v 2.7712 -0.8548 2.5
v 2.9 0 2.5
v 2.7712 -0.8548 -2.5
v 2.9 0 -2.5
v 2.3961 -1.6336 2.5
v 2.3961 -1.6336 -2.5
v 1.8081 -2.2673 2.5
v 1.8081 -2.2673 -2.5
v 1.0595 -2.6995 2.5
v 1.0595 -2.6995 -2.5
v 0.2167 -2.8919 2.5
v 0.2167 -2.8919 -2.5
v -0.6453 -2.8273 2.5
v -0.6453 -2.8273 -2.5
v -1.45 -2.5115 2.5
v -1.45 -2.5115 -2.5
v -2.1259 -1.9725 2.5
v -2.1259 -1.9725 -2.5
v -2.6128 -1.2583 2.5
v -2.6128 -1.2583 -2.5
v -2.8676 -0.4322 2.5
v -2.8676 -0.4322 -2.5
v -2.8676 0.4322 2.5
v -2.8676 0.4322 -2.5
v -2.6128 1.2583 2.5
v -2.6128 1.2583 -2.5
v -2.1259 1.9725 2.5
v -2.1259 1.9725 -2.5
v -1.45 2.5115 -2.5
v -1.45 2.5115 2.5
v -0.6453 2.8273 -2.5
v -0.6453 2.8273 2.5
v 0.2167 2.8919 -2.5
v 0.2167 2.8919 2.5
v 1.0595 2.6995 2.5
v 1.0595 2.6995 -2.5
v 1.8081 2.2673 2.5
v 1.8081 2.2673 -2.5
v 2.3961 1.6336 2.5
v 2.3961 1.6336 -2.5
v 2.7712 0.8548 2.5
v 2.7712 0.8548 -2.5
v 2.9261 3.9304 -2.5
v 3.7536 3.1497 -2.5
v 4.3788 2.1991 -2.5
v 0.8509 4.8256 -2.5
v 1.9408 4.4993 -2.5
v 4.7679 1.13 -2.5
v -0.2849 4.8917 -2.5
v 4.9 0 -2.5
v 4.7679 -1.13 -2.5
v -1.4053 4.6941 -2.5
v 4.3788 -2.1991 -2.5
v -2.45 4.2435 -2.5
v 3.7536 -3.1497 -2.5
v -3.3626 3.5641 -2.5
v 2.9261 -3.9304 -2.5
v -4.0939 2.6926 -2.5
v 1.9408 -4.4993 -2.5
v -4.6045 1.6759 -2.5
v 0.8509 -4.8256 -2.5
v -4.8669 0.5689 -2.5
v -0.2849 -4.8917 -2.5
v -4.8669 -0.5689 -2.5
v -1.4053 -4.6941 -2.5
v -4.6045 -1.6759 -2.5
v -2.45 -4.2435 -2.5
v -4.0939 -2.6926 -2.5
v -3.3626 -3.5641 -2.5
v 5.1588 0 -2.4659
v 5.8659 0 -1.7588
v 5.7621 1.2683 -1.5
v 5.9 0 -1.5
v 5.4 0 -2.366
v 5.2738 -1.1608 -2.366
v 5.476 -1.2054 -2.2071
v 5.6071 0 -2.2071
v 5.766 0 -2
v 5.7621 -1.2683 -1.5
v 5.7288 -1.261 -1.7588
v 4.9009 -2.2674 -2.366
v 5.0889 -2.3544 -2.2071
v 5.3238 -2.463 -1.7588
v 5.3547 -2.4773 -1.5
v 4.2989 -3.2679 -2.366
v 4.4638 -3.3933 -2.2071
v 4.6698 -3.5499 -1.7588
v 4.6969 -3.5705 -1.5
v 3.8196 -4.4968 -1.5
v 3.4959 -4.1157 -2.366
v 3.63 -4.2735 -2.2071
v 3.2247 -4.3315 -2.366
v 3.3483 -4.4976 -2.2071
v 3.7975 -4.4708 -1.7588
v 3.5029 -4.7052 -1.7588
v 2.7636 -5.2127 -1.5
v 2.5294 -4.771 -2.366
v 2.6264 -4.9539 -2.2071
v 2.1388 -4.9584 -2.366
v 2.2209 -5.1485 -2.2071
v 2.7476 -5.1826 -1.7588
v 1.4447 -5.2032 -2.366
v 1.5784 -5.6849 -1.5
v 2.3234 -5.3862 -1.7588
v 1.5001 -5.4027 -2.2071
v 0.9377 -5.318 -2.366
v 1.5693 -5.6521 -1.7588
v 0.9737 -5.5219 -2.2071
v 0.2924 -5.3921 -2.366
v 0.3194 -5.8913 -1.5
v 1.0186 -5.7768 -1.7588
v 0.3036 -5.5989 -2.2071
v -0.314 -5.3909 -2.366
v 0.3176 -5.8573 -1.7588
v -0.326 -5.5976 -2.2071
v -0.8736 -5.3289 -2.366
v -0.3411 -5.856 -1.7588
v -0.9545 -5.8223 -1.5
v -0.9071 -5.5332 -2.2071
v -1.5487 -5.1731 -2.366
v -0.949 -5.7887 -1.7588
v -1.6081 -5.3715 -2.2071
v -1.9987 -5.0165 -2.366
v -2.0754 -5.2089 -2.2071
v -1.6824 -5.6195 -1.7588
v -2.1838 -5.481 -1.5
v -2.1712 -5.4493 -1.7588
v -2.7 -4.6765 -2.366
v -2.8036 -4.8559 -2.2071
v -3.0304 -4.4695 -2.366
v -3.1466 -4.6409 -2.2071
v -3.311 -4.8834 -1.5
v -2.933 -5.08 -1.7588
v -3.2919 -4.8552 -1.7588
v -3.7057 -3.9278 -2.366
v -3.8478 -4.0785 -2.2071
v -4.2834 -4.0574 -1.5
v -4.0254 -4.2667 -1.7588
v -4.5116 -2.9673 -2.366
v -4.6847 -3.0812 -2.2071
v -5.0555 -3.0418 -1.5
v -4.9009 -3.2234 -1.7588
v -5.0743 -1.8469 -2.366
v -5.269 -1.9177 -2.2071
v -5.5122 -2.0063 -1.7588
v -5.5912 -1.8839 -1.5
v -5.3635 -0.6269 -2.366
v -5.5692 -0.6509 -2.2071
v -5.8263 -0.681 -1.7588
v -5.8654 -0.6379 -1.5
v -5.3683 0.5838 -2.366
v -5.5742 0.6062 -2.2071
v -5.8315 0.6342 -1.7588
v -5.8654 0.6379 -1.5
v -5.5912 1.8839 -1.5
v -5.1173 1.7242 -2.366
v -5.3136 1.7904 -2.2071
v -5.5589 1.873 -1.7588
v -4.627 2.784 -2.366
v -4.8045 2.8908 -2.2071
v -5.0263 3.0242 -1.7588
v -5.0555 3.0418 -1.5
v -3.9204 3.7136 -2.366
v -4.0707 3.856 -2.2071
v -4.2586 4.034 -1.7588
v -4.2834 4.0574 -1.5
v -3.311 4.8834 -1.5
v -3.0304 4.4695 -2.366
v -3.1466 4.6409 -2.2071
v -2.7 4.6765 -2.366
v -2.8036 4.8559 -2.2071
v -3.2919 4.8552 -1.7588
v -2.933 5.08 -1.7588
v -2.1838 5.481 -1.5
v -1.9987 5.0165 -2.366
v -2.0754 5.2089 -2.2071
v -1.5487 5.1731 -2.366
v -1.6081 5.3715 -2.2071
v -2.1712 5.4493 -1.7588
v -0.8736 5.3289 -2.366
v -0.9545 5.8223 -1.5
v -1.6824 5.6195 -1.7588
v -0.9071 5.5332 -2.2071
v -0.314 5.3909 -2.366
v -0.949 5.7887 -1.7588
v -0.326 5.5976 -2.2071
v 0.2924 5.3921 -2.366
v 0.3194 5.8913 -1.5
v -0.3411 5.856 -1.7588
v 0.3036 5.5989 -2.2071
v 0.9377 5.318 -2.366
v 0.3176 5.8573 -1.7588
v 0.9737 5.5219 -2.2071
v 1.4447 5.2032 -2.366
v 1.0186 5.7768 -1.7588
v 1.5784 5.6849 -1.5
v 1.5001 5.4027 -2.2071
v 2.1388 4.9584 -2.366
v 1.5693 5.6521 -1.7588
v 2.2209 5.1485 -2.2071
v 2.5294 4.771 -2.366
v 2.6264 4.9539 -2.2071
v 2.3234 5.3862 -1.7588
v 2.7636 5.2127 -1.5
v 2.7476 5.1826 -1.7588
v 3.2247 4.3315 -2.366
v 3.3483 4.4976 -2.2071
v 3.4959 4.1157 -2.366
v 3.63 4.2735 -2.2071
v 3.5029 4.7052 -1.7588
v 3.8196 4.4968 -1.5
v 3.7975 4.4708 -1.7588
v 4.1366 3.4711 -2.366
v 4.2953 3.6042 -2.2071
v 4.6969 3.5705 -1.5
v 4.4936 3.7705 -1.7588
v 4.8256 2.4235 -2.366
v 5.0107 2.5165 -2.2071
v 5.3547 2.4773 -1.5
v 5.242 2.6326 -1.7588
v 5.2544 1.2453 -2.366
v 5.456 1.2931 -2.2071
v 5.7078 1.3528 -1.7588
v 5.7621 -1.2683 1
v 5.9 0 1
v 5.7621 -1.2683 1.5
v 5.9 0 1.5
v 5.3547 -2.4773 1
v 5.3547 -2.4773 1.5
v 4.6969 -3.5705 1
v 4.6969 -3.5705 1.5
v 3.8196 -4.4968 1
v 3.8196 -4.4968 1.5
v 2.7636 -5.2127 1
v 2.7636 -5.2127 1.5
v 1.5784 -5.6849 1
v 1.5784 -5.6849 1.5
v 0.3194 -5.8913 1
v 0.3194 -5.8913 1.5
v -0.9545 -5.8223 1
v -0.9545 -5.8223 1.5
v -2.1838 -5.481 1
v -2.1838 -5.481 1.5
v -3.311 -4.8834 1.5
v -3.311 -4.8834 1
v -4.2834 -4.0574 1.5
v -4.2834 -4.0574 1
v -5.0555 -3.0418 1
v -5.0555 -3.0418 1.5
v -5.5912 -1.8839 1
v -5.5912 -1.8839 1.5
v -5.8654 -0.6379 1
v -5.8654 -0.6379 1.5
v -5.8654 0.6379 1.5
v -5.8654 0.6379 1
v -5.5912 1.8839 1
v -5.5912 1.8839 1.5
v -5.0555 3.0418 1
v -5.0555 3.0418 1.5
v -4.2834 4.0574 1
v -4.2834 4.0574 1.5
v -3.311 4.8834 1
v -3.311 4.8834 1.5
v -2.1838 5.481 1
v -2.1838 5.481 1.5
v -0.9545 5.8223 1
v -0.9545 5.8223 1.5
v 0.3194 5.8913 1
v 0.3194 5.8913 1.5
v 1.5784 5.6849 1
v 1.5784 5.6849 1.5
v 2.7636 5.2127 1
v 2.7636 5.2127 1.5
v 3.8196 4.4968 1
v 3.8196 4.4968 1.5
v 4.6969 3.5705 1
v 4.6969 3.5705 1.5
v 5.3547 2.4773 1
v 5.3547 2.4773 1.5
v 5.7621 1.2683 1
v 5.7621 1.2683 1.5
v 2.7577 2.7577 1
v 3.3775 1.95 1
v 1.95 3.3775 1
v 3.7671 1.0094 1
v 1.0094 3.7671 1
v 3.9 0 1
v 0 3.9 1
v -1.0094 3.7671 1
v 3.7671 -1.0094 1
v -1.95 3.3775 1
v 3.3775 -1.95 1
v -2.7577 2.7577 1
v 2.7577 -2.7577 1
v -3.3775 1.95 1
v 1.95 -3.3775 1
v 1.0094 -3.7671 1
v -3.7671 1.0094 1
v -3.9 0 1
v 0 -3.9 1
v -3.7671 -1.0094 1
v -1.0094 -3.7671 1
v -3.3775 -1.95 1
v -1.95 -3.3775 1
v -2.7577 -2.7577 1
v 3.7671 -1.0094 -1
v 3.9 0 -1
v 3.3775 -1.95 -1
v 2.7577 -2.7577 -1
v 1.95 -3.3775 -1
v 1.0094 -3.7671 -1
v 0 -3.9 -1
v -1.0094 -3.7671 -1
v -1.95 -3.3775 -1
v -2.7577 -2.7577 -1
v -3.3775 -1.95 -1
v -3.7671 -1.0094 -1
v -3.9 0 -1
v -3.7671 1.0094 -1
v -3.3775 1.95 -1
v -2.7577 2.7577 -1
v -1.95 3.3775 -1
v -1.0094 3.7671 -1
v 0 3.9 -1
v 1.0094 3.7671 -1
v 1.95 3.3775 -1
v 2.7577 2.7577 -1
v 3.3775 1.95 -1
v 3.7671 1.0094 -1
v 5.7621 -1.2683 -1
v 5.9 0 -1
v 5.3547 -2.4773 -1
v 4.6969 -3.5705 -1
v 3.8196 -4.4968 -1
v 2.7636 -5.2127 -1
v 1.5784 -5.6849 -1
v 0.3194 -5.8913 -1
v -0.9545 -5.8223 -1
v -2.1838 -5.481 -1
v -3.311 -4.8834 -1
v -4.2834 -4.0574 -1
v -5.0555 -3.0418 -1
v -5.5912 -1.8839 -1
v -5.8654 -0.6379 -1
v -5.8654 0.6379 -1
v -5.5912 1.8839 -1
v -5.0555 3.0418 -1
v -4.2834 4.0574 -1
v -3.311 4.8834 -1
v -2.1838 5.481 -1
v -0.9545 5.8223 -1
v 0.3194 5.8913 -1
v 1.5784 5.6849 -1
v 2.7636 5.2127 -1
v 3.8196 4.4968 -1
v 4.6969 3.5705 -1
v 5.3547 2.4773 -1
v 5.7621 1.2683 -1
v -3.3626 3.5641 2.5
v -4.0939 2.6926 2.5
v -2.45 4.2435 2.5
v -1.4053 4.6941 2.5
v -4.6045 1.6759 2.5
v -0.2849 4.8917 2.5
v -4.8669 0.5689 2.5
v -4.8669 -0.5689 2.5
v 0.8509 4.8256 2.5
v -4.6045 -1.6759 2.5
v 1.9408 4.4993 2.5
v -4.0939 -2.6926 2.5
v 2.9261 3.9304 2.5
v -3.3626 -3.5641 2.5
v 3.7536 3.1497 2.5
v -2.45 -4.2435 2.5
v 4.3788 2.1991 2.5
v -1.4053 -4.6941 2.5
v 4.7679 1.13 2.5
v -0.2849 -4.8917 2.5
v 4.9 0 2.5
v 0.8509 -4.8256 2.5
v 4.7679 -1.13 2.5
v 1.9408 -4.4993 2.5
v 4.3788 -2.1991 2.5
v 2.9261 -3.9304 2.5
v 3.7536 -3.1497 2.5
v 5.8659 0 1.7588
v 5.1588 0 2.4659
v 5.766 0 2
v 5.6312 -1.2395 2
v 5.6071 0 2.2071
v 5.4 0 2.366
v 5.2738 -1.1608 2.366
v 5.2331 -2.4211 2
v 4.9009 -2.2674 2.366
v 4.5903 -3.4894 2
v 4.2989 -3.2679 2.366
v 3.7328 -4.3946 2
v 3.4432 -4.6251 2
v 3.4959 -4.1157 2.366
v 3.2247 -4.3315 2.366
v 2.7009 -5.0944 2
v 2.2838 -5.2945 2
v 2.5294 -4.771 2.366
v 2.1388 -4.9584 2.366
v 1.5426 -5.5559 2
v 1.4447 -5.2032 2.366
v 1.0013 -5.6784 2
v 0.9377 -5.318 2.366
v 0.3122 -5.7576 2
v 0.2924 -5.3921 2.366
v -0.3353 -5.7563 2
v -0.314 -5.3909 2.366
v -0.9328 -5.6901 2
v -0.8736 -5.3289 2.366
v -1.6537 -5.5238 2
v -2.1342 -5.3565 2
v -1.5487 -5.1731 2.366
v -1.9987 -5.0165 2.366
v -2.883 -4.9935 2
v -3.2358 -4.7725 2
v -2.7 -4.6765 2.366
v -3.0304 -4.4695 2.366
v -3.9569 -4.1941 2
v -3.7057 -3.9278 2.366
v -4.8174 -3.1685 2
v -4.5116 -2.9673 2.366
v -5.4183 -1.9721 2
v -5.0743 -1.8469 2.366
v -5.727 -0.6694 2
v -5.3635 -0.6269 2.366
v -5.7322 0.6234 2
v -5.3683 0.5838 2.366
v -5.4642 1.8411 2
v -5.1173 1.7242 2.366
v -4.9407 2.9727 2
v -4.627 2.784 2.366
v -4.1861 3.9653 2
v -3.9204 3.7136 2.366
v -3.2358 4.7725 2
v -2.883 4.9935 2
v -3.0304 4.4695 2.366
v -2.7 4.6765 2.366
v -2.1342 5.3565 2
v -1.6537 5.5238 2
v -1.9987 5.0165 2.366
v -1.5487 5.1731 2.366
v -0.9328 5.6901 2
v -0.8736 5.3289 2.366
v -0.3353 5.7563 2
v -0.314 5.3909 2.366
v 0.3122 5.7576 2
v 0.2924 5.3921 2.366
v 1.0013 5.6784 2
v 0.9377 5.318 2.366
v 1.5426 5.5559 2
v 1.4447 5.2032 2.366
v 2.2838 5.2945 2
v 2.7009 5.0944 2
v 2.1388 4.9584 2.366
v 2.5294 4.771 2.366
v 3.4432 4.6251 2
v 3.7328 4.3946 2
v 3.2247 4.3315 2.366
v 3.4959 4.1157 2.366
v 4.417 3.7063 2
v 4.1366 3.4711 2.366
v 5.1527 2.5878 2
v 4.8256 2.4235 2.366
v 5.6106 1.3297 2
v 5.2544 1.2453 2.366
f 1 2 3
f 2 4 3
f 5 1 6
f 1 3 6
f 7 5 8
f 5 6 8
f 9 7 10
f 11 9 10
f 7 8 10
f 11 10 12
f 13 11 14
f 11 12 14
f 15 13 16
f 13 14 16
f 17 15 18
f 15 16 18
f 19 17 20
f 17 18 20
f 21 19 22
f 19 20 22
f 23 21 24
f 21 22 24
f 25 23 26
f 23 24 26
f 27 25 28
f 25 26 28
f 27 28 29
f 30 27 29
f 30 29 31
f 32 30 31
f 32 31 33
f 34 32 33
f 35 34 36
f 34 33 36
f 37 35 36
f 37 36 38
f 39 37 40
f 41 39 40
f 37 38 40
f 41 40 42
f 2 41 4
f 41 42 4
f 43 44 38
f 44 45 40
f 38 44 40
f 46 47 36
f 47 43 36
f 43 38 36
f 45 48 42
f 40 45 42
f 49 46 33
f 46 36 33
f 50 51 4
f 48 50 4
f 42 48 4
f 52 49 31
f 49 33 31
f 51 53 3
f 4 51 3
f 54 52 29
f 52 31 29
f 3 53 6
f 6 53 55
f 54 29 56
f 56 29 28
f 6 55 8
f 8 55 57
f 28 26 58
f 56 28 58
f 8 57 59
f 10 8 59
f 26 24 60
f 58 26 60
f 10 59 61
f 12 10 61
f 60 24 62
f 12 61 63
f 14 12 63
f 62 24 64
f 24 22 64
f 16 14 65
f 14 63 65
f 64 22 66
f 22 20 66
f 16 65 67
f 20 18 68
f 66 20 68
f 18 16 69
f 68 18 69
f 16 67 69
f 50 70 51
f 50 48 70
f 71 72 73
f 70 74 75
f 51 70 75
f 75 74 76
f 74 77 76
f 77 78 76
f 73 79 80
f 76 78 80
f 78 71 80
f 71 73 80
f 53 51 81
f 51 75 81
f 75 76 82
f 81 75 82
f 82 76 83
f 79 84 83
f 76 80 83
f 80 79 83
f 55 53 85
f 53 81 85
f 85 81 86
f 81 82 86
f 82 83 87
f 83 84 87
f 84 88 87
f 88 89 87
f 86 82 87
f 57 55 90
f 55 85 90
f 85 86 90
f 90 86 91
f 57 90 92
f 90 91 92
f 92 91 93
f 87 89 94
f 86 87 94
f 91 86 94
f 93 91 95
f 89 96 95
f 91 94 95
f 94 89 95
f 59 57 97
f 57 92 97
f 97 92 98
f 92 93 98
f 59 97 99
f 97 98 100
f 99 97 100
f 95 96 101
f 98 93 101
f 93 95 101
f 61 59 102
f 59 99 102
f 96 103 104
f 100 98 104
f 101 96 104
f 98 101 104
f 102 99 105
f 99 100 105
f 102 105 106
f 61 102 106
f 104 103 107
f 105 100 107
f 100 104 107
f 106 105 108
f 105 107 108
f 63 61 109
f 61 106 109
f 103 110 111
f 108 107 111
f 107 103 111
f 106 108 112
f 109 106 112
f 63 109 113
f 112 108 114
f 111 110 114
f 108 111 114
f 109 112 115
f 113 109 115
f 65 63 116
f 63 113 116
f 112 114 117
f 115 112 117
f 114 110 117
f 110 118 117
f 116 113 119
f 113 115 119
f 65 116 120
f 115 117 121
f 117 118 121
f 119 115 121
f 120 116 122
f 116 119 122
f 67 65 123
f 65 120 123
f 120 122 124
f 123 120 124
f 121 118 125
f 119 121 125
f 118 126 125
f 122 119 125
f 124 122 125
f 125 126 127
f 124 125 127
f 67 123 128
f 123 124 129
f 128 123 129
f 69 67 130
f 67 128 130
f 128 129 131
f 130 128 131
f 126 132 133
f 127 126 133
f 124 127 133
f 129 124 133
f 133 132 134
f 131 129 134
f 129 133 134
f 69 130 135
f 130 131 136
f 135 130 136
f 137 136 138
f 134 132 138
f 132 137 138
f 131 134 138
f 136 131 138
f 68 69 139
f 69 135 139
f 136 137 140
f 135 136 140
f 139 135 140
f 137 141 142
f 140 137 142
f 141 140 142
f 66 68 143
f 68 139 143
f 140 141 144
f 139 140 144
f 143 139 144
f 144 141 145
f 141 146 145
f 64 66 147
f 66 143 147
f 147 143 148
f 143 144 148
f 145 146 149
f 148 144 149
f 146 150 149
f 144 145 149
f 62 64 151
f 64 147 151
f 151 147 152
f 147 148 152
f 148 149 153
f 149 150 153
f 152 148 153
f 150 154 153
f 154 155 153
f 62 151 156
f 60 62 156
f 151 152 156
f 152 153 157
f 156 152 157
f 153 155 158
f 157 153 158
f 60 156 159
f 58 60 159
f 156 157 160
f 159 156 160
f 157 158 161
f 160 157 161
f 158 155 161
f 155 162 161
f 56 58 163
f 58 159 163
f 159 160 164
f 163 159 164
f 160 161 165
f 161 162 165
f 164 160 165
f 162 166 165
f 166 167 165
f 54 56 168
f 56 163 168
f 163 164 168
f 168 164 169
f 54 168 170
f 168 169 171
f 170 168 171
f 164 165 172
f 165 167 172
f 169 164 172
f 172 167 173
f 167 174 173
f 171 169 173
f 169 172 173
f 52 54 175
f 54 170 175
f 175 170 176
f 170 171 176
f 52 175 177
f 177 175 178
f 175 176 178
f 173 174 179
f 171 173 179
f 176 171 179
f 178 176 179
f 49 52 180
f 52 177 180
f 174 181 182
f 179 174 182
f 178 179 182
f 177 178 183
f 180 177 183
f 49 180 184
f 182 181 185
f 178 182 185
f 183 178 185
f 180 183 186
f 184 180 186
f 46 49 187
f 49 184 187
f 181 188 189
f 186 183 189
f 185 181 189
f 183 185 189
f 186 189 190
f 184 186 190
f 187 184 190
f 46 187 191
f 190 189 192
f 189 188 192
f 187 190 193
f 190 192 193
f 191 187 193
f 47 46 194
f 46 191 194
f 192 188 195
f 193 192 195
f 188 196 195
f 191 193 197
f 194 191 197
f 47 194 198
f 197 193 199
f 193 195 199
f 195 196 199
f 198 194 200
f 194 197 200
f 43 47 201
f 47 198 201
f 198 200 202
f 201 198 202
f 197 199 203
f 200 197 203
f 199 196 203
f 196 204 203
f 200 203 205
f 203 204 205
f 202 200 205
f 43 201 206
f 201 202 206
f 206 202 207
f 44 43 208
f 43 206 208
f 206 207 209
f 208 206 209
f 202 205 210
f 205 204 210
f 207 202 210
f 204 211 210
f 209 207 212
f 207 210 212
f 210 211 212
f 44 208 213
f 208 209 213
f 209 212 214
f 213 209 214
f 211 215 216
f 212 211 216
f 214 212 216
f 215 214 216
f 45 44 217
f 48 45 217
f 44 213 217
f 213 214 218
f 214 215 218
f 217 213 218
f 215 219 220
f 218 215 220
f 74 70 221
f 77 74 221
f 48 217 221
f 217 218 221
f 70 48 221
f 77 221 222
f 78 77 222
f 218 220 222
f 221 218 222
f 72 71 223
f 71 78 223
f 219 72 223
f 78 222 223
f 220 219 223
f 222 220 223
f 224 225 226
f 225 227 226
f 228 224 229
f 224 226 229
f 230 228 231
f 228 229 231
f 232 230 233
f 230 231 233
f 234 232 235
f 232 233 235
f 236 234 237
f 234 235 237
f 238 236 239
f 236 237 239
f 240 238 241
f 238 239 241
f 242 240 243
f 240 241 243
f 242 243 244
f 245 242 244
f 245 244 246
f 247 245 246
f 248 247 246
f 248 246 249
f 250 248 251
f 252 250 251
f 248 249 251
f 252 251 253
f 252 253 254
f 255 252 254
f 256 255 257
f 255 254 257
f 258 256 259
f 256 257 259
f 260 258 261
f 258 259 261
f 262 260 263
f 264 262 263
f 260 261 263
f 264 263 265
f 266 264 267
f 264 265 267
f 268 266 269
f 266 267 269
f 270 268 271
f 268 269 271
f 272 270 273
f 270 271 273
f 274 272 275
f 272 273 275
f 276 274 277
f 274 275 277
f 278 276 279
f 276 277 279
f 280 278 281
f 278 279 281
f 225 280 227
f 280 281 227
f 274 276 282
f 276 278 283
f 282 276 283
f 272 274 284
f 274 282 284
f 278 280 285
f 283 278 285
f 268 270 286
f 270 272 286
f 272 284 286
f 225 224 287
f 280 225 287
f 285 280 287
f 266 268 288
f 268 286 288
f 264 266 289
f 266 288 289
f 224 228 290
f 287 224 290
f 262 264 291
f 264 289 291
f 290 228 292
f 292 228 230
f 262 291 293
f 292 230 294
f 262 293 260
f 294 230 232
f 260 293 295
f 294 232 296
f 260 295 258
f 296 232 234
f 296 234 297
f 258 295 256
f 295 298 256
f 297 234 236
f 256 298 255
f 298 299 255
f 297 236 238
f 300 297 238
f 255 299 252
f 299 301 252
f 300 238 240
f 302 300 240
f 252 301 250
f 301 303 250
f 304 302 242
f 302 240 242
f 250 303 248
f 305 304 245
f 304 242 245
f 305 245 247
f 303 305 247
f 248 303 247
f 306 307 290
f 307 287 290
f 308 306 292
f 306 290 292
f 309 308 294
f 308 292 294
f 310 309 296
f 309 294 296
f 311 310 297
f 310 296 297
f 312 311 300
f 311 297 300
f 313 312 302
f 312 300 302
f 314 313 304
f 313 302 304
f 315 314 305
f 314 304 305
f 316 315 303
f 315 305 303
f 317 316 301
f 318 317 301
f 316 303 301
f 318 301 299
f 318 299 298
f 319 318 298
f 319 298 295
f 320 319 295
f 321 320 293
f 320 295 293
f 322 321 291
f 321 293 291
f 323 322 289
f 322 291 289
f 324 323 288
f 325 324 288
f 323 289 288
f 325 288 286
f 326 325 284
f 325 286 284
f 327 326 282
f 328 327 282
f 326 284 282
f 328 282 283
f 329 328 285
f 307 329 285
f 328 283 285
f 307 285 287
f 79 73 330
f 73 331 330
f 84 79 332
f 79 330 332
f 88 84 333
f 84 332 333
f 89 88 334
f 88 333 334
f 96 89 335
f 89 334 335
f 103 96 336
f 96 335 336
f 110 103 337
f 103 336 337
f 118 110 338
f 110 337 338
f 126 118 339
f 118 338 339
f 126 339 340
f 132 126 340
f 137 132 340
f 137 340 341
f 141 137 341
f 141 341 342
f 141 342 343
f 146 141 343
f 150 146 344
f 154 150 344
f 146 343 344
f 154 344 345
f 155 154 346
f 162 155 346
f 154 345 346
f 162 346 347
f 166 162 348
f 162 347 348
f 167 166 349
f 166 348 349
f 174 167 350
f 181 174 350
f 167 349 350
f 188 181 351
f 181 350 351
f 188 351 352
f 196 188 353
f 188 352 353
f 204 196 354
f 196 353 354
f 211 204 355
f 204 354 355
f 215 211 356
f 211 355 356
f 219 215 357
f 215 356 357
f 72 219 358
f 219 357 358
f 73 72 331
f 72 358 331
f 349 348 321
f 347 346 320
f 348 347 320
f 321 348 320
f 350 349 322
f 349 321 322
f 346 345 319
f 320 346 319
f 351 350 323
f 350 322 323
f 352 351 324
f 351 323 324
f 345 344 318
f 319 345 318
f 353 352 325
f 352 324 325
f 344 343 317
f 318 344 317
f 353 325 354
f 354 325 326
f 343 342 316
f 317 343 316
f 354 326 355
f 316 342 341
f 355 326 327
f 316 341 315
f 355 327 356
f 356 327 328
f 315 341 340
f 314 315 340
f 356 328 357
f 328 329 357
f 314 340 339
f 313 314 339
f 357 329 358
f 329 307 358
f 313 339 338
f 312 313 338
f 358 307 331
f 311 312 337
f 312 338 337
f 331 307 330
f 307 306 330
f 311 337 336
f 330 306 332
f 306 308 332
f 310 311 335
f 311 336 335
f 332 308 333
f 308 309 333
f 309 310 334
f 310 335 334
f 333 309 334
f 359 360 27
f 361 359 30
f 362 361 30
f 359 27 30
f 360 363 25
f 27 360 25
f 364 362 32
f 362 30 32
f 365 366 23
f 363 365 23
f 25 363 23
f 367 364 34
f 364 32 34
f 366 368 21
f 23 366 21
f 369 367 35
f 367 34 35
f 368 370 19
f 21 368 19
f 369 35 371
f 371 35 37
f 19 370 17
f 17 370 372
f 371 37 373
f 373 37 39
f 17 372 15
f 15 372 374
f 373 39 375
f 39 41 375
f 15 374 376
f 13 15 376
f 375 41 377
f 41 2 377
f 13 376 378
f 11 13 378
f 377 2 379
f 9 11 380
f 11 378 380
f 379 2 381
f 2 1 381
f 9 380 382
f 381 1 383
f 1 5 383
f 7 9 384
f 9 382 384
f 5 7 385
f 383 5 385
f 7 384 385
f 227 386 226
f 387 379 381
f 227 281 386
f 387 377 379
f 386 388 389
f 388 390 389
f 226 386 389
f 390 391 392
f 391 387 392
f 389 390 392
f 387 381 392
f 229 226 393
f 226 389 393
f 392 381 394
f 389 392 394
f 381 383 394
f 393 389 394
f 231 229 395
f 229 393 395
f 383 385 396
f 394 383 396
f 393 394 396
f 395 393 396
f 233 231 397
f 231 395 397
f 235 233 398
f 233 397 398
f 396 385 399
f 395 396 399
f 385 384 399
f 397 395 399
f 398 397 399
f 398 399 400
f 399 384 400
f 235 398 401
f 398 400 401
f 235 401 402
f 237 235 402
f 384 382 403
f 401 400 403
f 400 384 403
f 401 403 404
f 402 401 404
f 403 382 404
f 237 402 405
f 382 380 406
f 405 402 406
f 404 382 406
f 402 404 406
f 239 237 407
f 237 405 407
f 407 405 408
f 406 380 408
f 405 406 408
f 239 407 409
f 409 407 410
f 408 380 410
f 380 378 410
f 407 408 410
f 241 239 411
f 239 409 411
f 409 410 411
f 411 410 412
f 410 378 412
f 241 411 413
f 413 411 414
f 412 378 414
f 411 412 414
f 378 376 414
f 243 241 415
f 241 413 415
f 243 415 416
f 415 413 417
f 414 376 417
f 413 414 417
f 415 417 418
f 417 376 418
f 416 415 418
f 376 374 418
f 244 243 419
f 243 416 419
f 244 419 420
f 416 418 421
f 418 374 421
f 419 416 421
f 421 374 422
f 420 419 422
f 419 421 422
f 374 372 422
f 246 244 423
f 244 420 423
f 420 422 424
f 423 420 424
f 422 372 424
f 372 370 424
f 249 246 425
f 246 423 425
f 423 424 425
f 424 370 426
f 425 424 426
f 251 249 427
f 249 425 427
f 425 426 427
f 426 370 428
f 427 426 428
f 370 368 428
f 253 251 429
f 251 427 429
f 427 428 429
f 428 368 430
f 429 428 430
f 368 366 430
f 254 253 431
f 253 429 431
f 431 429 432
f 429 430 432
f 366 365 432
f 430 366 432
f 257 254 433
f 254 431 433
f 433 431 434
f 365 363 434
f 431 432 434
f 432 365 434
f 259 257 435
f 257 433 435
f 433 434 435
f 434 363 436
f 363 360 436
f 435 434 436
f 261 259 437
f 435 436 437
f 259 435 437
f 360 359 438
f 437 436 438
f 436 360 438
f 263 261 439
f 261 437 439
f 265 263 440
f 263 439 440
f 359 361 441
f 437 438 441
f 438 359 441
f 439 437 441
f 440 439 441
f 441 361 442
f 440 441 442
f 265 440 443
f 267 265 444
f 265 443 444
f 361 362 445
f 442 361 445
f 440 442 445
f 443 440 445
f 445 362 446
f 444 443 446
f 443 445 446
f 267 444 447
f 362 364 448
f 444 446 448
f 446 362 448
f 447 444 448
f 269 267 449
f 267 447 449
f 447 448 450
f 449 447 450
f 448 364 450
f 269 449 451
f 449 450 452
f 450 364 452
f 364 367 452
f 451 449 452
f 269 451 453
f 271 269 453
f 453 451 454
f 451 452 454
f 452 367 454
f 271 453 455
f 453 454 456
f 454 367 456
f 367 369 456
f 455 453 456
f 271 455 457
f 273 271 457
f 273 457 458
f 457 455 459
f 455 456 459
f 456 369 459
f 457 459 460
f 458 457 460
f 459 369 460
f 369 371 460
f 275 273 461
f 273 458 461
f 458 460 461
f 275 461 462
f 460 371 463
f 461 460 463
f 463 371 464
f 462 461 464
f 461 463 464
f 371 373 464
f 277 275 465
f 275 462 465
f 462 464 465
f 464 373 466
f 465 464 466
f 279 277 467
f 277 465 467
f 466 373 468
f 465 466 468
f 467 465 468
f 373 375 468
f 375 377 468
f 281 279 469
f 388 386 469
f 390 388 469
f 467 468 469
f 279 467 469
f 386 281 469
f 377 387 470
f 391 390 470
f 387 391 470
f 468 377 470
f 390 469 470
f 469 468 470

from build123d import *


with BuildPart() as part:
    # Çizim2 → Döndür2 (revolve)
    with BuildSketch(Plane(origin=(0, 0, 0), x_dir=(0, 0, -1), z_dir=(0, 1, 0)), mode=Mode.PRIVATE) as d_nd_r2_sk:
        with BuildLine():
            Line((-2.5, 2.9), (2.5, 2.9))
            Line((2.5, 2.9), (2.5, 4.9))
            ThreePointArc((2.5, 4.9), (2.207106781, 5.607106781), (1.5, 5.9))
            Line((1.5, 5.9), (1, 5.9))
            Line((1, 5.9), (1, 3.9))
            Line((1, 3.9), (-1, 3.9))
            Line((-1, 3.9), (-1, 5.9))
            Line((-1, 5.9), (-1.5, 5.9))
            ThreePointArc((-1.5, 5.9), (-2.207106781, 5.607106781), (-2.5, 4.9))
            Line((-2.5, 4.9), (-2.5, 2.9))
        make_face()
    revolve(d_nd_r2_sk.sketch.rotate(Axis((0, 0, 0), (0, 0, -1)), 180), axis=Axis((0, 0, 0), (0, 0, -1)))


solid = part.part
